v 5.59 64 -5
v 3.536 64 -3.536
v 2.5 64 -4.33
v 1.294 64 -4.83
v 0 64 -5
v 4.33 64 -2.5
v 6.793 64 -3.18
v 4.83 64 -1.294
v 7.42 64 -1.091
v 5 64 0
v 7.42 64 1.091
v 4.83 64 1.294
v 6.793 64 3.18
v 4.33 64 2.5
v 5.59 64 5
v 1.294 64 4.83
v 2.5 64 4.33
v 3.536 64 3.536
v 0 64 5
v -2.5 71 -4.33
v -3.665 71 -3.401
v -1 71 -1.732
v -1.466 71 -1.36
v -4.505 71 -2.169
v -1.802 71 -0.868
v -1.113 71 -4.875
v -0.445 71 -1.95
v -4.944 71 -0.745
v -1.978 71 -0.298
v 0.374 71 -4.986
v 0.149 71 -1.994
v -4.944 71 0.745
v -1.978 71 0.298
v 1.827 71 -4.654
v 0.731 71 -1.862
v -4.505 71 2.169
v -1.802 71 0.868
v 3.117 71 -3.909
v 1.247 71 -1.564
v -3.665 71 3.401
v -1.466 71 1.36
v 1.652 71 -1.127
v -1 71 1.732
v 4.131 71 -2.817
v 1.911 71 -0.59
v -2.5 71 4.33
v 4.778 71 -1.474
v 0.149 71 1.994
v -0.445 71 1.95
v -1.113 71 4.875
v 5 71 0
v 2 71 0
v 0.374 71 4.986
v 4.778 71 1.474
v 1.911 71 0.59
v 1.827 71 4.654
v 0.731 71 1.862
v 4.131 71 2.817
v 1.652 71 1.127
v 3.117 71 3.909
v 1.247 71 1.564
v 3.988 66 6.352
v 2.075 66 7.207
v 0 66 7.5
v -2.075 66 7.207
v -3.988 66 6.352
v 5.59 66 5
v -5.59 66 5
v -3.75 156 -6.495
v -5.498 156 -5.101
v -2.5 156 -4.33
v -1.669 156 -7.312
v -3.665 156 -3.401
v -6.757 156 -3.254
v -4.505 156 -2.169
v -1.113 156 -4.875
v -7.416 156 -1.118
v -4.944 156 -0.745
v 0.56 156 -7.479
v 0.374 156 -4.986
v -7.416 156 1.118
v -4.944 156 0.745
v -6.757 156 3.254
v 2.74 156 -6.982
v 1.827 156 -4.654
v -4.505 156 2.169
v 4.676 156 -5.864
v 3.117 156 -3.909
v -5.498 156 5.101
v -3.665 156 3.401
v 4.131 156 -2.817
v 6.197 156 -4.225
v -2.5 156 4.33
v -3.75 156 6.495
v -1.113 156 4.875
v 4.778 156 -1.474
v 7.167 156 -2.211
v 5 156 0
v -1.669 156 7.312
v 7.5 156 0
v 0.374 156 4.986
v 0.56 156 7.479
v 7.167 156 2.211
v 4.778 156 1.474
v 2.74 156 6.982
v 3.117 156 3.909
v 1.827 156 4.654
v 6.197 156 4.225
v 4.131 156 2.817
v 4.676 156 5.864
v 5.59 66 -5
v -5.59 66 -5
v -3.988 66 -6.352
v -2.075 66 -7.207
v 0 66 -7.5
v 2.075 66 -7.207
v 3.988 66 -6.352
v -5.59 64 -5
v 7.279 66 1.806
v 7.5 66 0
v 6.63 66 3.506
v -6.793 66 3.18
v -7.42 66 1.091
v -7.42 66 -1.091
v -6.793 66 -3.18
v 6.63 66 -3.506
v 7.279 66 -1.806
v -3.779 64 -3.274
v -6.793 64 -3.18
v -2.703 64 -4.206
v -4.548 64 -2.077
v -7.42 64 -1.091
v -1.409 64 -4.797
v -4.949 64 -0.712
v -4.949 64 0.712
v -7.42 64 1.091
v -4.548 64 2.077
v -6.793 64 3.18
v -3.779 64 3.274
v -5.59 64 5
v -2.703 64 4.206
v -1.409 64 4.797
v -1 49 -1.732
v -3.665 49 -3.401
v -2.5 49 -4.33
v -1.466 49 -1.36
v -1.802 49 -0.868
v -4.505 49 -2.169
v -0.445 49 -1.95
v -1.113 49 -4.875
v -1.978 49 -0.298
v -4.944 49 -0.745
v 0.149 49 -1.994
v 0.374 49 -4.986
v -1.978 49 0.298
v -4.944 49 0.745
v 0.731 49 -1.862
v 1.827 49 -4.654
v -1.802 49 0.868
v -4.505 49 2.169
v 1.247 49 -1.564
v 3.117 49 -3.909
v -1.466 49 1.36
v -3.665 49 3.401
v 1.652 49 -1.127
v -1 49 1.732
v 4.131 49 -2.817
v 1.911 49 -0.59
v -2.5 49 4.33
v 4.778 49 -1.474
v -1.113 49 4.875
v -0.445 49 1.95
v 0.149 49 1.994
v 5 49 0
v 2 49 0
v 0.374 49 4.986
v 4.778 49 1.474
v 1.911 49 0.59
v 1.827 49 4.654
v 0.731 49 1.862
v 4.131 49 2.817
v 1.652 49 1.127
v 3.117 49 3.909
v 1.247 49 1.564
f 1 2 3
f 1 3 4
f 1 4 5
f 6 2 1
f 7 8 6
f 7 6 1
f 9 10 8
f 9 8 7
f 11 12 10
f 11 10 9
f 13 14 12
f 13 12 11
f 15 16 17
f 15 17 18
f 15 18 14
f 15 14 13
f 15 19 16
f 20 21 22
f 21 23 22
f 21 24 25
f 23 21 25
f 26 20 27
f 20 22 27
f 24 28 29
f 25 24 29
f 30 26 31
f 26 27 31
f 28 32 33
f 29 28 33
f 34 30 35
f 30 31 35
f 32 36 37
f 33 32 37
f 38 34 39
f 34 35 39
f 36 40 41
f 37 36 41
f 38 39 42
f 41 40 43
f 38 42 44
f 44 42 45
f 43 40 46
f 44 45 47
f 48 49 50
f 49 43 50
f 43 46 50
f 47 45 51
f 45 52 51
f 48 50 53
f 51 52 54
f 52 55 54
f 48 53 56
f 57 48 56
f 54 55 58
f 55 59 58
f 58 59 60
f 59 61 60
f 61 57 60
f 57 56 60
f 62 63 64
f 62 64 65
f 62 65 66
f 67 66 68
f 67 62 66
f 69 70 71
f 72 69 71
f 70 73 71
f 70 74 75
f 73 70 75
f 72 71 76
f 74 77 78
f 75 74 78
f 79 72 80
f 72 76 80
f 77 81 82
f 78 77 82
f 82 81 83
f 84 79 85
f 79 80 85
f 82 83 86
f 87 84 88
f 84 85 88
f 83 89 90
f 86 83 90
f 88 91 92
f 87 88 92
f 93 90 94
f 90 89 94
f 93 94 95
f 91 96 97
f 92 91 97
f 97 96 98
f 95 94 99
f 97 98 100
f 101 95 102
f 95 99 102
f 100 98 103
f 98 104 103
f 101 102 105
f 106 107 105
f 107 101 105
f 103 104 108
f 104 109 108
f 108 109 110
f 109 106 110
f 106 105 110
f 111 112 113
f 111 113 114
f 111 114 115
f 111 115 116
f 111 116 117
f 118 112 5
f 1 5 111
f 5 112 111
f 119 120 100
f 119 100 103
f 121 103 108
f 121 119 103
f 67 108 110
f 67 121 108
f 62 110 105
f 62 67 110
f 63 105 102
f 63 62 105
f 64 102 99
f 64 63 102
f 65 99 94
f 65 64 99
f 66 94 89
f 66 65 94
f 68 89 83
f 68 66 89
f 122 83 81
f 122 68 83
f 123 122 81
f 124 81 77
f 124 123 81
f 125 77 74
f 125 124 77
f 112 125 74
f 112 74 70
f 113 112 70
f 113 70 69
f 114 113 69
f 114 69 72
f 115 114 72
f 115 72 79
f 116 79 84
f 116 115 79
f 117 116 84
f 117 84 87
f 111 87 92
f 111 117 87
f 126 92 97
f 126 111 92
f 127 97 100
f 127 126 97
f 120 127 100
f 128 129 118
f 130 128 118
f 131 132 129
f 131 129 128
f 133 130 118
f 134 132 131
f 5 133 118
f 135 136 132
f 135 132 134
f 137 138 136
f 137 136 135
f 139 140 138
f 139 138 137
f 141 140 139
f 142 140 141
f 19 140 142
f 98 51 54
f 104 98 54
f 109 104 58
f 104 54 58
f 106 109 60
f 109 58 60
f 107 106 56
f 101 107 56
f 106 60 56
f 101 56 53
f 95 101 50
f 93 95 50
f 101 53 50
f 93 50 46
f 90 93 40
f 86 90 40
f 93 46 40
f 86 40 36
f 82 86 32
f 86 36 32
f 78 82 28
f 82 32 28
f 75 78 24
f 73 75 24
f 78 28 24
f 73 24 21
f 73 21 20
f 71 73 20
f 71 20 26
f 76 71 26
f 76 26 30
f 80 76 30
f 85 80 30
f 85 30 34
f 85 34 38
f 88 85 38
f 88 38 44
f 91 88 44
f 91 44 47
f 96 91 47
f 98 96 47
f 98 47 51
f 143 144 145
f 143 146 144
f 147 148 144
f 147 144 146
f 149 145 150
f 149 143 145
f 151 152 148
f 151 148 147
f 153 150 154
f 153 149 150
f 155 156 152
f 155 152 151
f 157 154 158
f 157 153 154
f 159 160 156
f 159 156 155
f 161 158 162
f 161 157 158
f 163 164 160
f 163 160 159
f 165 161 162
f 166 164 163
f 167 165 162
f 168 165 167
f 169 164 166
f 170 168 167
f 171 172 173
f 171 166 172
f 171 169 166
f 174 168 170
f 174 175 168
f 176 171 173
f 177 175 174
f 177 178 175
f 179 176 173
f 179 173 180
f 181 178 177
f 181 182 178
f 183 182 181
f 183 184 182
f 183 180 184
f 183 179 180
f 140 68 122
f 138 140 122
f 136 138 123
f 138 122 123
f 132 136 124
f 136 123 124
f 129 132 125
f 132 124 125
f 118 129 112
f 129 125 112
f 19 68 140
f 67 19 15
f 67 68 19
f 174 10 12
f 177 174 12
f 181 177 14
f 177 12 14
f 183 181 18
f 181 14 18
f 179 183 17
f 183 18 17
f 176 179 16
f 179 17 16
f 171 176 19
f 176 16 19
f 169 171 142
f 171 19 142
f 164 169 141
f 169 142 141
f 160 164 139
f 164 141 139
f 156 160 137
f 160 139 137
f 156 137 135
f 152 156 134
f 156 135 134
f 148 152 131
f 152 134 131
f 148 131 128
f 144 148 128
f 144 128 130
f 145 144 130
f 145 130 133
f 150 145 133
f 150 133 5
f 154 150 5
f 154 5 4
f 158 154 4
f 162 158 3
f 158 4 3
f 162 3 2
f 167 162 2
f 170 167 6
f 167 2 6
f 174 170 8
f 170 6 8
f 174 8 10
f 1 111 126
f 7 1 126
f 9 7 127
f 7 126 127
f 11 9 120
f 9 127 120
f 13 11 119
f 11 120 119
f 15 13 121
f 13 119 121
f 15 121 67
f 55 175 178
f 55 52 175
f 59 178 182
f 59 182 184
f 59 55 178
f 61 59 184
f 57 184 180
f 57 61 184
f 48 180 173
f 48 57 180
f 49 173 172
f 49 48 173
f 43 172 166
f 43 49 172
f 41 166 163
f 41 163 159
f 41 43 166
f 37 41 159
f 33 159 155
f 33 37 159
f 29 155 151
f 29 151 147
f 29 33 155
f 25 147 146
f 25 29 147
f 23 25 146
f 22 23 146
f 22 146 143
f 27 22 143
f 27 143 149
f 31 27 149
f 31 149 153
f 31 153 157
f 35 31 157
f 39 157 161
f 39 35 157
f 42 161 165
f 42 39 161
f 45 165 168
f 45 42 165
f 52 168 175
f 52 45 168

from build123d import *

# Parameters (mm, degrees)
SKETCH053_R       = 7.5
SKETCH053_R_2     = 5
PAD_DEPTH         = 90
SKETCH055_R       = 5
SKETCH055_R_2     = 2
PAD026_DEPTH      = 5
PAD026_DEPTH_BACK = 17
SKETCH085_R       = 2
PAD046_DEPTH      = 2


with BuildPart() as part:
    # Sketch053 → Pad (new body)
    with BuildSketch(Plane.XZ.offset(-66)):
        Circle(SKETCH053_R)
        Circle(SKETCH053_R_2, mode=Mode.SUBTRACT)
    extrude(amount=-PAD_DEPTH)

    # Sketch055 → Pad026 (join, two sides)
    with BuildSketch(Plane.XZ.offset(-66)) as pad026_sk:
        Circle(SKETCH055_R)
        Circle(SKETCH055_R_2, mode=Mode.SUBTRACT)
    extrude(amount=-PAD026_DEPTH)
    extrude(pad026_sk.sketch, amount=PAD026_DEPTH_BACK)

    # Sketch085 → Pad046 (join)
    with BuildSketch(Plane.XZ.offset(-66)):
        with BuildLine():
            ThreePointArc((-5.59017, 5), (-7.5, 0), (-5.59017, -5))
            Line((-5.59017, -5), (5.59017, -5))
            ThreePointArc((5.59017, -5), (7.5, 0), (5.59017, 5))
            Line((-5.59017, 5), (5.59017, 5))
        make_face()
        Circle(SKETCH085_R, mode=Mode.SUBTRACT)
    extrude(amount=PAD046_DEPTH)


solid = part.part
